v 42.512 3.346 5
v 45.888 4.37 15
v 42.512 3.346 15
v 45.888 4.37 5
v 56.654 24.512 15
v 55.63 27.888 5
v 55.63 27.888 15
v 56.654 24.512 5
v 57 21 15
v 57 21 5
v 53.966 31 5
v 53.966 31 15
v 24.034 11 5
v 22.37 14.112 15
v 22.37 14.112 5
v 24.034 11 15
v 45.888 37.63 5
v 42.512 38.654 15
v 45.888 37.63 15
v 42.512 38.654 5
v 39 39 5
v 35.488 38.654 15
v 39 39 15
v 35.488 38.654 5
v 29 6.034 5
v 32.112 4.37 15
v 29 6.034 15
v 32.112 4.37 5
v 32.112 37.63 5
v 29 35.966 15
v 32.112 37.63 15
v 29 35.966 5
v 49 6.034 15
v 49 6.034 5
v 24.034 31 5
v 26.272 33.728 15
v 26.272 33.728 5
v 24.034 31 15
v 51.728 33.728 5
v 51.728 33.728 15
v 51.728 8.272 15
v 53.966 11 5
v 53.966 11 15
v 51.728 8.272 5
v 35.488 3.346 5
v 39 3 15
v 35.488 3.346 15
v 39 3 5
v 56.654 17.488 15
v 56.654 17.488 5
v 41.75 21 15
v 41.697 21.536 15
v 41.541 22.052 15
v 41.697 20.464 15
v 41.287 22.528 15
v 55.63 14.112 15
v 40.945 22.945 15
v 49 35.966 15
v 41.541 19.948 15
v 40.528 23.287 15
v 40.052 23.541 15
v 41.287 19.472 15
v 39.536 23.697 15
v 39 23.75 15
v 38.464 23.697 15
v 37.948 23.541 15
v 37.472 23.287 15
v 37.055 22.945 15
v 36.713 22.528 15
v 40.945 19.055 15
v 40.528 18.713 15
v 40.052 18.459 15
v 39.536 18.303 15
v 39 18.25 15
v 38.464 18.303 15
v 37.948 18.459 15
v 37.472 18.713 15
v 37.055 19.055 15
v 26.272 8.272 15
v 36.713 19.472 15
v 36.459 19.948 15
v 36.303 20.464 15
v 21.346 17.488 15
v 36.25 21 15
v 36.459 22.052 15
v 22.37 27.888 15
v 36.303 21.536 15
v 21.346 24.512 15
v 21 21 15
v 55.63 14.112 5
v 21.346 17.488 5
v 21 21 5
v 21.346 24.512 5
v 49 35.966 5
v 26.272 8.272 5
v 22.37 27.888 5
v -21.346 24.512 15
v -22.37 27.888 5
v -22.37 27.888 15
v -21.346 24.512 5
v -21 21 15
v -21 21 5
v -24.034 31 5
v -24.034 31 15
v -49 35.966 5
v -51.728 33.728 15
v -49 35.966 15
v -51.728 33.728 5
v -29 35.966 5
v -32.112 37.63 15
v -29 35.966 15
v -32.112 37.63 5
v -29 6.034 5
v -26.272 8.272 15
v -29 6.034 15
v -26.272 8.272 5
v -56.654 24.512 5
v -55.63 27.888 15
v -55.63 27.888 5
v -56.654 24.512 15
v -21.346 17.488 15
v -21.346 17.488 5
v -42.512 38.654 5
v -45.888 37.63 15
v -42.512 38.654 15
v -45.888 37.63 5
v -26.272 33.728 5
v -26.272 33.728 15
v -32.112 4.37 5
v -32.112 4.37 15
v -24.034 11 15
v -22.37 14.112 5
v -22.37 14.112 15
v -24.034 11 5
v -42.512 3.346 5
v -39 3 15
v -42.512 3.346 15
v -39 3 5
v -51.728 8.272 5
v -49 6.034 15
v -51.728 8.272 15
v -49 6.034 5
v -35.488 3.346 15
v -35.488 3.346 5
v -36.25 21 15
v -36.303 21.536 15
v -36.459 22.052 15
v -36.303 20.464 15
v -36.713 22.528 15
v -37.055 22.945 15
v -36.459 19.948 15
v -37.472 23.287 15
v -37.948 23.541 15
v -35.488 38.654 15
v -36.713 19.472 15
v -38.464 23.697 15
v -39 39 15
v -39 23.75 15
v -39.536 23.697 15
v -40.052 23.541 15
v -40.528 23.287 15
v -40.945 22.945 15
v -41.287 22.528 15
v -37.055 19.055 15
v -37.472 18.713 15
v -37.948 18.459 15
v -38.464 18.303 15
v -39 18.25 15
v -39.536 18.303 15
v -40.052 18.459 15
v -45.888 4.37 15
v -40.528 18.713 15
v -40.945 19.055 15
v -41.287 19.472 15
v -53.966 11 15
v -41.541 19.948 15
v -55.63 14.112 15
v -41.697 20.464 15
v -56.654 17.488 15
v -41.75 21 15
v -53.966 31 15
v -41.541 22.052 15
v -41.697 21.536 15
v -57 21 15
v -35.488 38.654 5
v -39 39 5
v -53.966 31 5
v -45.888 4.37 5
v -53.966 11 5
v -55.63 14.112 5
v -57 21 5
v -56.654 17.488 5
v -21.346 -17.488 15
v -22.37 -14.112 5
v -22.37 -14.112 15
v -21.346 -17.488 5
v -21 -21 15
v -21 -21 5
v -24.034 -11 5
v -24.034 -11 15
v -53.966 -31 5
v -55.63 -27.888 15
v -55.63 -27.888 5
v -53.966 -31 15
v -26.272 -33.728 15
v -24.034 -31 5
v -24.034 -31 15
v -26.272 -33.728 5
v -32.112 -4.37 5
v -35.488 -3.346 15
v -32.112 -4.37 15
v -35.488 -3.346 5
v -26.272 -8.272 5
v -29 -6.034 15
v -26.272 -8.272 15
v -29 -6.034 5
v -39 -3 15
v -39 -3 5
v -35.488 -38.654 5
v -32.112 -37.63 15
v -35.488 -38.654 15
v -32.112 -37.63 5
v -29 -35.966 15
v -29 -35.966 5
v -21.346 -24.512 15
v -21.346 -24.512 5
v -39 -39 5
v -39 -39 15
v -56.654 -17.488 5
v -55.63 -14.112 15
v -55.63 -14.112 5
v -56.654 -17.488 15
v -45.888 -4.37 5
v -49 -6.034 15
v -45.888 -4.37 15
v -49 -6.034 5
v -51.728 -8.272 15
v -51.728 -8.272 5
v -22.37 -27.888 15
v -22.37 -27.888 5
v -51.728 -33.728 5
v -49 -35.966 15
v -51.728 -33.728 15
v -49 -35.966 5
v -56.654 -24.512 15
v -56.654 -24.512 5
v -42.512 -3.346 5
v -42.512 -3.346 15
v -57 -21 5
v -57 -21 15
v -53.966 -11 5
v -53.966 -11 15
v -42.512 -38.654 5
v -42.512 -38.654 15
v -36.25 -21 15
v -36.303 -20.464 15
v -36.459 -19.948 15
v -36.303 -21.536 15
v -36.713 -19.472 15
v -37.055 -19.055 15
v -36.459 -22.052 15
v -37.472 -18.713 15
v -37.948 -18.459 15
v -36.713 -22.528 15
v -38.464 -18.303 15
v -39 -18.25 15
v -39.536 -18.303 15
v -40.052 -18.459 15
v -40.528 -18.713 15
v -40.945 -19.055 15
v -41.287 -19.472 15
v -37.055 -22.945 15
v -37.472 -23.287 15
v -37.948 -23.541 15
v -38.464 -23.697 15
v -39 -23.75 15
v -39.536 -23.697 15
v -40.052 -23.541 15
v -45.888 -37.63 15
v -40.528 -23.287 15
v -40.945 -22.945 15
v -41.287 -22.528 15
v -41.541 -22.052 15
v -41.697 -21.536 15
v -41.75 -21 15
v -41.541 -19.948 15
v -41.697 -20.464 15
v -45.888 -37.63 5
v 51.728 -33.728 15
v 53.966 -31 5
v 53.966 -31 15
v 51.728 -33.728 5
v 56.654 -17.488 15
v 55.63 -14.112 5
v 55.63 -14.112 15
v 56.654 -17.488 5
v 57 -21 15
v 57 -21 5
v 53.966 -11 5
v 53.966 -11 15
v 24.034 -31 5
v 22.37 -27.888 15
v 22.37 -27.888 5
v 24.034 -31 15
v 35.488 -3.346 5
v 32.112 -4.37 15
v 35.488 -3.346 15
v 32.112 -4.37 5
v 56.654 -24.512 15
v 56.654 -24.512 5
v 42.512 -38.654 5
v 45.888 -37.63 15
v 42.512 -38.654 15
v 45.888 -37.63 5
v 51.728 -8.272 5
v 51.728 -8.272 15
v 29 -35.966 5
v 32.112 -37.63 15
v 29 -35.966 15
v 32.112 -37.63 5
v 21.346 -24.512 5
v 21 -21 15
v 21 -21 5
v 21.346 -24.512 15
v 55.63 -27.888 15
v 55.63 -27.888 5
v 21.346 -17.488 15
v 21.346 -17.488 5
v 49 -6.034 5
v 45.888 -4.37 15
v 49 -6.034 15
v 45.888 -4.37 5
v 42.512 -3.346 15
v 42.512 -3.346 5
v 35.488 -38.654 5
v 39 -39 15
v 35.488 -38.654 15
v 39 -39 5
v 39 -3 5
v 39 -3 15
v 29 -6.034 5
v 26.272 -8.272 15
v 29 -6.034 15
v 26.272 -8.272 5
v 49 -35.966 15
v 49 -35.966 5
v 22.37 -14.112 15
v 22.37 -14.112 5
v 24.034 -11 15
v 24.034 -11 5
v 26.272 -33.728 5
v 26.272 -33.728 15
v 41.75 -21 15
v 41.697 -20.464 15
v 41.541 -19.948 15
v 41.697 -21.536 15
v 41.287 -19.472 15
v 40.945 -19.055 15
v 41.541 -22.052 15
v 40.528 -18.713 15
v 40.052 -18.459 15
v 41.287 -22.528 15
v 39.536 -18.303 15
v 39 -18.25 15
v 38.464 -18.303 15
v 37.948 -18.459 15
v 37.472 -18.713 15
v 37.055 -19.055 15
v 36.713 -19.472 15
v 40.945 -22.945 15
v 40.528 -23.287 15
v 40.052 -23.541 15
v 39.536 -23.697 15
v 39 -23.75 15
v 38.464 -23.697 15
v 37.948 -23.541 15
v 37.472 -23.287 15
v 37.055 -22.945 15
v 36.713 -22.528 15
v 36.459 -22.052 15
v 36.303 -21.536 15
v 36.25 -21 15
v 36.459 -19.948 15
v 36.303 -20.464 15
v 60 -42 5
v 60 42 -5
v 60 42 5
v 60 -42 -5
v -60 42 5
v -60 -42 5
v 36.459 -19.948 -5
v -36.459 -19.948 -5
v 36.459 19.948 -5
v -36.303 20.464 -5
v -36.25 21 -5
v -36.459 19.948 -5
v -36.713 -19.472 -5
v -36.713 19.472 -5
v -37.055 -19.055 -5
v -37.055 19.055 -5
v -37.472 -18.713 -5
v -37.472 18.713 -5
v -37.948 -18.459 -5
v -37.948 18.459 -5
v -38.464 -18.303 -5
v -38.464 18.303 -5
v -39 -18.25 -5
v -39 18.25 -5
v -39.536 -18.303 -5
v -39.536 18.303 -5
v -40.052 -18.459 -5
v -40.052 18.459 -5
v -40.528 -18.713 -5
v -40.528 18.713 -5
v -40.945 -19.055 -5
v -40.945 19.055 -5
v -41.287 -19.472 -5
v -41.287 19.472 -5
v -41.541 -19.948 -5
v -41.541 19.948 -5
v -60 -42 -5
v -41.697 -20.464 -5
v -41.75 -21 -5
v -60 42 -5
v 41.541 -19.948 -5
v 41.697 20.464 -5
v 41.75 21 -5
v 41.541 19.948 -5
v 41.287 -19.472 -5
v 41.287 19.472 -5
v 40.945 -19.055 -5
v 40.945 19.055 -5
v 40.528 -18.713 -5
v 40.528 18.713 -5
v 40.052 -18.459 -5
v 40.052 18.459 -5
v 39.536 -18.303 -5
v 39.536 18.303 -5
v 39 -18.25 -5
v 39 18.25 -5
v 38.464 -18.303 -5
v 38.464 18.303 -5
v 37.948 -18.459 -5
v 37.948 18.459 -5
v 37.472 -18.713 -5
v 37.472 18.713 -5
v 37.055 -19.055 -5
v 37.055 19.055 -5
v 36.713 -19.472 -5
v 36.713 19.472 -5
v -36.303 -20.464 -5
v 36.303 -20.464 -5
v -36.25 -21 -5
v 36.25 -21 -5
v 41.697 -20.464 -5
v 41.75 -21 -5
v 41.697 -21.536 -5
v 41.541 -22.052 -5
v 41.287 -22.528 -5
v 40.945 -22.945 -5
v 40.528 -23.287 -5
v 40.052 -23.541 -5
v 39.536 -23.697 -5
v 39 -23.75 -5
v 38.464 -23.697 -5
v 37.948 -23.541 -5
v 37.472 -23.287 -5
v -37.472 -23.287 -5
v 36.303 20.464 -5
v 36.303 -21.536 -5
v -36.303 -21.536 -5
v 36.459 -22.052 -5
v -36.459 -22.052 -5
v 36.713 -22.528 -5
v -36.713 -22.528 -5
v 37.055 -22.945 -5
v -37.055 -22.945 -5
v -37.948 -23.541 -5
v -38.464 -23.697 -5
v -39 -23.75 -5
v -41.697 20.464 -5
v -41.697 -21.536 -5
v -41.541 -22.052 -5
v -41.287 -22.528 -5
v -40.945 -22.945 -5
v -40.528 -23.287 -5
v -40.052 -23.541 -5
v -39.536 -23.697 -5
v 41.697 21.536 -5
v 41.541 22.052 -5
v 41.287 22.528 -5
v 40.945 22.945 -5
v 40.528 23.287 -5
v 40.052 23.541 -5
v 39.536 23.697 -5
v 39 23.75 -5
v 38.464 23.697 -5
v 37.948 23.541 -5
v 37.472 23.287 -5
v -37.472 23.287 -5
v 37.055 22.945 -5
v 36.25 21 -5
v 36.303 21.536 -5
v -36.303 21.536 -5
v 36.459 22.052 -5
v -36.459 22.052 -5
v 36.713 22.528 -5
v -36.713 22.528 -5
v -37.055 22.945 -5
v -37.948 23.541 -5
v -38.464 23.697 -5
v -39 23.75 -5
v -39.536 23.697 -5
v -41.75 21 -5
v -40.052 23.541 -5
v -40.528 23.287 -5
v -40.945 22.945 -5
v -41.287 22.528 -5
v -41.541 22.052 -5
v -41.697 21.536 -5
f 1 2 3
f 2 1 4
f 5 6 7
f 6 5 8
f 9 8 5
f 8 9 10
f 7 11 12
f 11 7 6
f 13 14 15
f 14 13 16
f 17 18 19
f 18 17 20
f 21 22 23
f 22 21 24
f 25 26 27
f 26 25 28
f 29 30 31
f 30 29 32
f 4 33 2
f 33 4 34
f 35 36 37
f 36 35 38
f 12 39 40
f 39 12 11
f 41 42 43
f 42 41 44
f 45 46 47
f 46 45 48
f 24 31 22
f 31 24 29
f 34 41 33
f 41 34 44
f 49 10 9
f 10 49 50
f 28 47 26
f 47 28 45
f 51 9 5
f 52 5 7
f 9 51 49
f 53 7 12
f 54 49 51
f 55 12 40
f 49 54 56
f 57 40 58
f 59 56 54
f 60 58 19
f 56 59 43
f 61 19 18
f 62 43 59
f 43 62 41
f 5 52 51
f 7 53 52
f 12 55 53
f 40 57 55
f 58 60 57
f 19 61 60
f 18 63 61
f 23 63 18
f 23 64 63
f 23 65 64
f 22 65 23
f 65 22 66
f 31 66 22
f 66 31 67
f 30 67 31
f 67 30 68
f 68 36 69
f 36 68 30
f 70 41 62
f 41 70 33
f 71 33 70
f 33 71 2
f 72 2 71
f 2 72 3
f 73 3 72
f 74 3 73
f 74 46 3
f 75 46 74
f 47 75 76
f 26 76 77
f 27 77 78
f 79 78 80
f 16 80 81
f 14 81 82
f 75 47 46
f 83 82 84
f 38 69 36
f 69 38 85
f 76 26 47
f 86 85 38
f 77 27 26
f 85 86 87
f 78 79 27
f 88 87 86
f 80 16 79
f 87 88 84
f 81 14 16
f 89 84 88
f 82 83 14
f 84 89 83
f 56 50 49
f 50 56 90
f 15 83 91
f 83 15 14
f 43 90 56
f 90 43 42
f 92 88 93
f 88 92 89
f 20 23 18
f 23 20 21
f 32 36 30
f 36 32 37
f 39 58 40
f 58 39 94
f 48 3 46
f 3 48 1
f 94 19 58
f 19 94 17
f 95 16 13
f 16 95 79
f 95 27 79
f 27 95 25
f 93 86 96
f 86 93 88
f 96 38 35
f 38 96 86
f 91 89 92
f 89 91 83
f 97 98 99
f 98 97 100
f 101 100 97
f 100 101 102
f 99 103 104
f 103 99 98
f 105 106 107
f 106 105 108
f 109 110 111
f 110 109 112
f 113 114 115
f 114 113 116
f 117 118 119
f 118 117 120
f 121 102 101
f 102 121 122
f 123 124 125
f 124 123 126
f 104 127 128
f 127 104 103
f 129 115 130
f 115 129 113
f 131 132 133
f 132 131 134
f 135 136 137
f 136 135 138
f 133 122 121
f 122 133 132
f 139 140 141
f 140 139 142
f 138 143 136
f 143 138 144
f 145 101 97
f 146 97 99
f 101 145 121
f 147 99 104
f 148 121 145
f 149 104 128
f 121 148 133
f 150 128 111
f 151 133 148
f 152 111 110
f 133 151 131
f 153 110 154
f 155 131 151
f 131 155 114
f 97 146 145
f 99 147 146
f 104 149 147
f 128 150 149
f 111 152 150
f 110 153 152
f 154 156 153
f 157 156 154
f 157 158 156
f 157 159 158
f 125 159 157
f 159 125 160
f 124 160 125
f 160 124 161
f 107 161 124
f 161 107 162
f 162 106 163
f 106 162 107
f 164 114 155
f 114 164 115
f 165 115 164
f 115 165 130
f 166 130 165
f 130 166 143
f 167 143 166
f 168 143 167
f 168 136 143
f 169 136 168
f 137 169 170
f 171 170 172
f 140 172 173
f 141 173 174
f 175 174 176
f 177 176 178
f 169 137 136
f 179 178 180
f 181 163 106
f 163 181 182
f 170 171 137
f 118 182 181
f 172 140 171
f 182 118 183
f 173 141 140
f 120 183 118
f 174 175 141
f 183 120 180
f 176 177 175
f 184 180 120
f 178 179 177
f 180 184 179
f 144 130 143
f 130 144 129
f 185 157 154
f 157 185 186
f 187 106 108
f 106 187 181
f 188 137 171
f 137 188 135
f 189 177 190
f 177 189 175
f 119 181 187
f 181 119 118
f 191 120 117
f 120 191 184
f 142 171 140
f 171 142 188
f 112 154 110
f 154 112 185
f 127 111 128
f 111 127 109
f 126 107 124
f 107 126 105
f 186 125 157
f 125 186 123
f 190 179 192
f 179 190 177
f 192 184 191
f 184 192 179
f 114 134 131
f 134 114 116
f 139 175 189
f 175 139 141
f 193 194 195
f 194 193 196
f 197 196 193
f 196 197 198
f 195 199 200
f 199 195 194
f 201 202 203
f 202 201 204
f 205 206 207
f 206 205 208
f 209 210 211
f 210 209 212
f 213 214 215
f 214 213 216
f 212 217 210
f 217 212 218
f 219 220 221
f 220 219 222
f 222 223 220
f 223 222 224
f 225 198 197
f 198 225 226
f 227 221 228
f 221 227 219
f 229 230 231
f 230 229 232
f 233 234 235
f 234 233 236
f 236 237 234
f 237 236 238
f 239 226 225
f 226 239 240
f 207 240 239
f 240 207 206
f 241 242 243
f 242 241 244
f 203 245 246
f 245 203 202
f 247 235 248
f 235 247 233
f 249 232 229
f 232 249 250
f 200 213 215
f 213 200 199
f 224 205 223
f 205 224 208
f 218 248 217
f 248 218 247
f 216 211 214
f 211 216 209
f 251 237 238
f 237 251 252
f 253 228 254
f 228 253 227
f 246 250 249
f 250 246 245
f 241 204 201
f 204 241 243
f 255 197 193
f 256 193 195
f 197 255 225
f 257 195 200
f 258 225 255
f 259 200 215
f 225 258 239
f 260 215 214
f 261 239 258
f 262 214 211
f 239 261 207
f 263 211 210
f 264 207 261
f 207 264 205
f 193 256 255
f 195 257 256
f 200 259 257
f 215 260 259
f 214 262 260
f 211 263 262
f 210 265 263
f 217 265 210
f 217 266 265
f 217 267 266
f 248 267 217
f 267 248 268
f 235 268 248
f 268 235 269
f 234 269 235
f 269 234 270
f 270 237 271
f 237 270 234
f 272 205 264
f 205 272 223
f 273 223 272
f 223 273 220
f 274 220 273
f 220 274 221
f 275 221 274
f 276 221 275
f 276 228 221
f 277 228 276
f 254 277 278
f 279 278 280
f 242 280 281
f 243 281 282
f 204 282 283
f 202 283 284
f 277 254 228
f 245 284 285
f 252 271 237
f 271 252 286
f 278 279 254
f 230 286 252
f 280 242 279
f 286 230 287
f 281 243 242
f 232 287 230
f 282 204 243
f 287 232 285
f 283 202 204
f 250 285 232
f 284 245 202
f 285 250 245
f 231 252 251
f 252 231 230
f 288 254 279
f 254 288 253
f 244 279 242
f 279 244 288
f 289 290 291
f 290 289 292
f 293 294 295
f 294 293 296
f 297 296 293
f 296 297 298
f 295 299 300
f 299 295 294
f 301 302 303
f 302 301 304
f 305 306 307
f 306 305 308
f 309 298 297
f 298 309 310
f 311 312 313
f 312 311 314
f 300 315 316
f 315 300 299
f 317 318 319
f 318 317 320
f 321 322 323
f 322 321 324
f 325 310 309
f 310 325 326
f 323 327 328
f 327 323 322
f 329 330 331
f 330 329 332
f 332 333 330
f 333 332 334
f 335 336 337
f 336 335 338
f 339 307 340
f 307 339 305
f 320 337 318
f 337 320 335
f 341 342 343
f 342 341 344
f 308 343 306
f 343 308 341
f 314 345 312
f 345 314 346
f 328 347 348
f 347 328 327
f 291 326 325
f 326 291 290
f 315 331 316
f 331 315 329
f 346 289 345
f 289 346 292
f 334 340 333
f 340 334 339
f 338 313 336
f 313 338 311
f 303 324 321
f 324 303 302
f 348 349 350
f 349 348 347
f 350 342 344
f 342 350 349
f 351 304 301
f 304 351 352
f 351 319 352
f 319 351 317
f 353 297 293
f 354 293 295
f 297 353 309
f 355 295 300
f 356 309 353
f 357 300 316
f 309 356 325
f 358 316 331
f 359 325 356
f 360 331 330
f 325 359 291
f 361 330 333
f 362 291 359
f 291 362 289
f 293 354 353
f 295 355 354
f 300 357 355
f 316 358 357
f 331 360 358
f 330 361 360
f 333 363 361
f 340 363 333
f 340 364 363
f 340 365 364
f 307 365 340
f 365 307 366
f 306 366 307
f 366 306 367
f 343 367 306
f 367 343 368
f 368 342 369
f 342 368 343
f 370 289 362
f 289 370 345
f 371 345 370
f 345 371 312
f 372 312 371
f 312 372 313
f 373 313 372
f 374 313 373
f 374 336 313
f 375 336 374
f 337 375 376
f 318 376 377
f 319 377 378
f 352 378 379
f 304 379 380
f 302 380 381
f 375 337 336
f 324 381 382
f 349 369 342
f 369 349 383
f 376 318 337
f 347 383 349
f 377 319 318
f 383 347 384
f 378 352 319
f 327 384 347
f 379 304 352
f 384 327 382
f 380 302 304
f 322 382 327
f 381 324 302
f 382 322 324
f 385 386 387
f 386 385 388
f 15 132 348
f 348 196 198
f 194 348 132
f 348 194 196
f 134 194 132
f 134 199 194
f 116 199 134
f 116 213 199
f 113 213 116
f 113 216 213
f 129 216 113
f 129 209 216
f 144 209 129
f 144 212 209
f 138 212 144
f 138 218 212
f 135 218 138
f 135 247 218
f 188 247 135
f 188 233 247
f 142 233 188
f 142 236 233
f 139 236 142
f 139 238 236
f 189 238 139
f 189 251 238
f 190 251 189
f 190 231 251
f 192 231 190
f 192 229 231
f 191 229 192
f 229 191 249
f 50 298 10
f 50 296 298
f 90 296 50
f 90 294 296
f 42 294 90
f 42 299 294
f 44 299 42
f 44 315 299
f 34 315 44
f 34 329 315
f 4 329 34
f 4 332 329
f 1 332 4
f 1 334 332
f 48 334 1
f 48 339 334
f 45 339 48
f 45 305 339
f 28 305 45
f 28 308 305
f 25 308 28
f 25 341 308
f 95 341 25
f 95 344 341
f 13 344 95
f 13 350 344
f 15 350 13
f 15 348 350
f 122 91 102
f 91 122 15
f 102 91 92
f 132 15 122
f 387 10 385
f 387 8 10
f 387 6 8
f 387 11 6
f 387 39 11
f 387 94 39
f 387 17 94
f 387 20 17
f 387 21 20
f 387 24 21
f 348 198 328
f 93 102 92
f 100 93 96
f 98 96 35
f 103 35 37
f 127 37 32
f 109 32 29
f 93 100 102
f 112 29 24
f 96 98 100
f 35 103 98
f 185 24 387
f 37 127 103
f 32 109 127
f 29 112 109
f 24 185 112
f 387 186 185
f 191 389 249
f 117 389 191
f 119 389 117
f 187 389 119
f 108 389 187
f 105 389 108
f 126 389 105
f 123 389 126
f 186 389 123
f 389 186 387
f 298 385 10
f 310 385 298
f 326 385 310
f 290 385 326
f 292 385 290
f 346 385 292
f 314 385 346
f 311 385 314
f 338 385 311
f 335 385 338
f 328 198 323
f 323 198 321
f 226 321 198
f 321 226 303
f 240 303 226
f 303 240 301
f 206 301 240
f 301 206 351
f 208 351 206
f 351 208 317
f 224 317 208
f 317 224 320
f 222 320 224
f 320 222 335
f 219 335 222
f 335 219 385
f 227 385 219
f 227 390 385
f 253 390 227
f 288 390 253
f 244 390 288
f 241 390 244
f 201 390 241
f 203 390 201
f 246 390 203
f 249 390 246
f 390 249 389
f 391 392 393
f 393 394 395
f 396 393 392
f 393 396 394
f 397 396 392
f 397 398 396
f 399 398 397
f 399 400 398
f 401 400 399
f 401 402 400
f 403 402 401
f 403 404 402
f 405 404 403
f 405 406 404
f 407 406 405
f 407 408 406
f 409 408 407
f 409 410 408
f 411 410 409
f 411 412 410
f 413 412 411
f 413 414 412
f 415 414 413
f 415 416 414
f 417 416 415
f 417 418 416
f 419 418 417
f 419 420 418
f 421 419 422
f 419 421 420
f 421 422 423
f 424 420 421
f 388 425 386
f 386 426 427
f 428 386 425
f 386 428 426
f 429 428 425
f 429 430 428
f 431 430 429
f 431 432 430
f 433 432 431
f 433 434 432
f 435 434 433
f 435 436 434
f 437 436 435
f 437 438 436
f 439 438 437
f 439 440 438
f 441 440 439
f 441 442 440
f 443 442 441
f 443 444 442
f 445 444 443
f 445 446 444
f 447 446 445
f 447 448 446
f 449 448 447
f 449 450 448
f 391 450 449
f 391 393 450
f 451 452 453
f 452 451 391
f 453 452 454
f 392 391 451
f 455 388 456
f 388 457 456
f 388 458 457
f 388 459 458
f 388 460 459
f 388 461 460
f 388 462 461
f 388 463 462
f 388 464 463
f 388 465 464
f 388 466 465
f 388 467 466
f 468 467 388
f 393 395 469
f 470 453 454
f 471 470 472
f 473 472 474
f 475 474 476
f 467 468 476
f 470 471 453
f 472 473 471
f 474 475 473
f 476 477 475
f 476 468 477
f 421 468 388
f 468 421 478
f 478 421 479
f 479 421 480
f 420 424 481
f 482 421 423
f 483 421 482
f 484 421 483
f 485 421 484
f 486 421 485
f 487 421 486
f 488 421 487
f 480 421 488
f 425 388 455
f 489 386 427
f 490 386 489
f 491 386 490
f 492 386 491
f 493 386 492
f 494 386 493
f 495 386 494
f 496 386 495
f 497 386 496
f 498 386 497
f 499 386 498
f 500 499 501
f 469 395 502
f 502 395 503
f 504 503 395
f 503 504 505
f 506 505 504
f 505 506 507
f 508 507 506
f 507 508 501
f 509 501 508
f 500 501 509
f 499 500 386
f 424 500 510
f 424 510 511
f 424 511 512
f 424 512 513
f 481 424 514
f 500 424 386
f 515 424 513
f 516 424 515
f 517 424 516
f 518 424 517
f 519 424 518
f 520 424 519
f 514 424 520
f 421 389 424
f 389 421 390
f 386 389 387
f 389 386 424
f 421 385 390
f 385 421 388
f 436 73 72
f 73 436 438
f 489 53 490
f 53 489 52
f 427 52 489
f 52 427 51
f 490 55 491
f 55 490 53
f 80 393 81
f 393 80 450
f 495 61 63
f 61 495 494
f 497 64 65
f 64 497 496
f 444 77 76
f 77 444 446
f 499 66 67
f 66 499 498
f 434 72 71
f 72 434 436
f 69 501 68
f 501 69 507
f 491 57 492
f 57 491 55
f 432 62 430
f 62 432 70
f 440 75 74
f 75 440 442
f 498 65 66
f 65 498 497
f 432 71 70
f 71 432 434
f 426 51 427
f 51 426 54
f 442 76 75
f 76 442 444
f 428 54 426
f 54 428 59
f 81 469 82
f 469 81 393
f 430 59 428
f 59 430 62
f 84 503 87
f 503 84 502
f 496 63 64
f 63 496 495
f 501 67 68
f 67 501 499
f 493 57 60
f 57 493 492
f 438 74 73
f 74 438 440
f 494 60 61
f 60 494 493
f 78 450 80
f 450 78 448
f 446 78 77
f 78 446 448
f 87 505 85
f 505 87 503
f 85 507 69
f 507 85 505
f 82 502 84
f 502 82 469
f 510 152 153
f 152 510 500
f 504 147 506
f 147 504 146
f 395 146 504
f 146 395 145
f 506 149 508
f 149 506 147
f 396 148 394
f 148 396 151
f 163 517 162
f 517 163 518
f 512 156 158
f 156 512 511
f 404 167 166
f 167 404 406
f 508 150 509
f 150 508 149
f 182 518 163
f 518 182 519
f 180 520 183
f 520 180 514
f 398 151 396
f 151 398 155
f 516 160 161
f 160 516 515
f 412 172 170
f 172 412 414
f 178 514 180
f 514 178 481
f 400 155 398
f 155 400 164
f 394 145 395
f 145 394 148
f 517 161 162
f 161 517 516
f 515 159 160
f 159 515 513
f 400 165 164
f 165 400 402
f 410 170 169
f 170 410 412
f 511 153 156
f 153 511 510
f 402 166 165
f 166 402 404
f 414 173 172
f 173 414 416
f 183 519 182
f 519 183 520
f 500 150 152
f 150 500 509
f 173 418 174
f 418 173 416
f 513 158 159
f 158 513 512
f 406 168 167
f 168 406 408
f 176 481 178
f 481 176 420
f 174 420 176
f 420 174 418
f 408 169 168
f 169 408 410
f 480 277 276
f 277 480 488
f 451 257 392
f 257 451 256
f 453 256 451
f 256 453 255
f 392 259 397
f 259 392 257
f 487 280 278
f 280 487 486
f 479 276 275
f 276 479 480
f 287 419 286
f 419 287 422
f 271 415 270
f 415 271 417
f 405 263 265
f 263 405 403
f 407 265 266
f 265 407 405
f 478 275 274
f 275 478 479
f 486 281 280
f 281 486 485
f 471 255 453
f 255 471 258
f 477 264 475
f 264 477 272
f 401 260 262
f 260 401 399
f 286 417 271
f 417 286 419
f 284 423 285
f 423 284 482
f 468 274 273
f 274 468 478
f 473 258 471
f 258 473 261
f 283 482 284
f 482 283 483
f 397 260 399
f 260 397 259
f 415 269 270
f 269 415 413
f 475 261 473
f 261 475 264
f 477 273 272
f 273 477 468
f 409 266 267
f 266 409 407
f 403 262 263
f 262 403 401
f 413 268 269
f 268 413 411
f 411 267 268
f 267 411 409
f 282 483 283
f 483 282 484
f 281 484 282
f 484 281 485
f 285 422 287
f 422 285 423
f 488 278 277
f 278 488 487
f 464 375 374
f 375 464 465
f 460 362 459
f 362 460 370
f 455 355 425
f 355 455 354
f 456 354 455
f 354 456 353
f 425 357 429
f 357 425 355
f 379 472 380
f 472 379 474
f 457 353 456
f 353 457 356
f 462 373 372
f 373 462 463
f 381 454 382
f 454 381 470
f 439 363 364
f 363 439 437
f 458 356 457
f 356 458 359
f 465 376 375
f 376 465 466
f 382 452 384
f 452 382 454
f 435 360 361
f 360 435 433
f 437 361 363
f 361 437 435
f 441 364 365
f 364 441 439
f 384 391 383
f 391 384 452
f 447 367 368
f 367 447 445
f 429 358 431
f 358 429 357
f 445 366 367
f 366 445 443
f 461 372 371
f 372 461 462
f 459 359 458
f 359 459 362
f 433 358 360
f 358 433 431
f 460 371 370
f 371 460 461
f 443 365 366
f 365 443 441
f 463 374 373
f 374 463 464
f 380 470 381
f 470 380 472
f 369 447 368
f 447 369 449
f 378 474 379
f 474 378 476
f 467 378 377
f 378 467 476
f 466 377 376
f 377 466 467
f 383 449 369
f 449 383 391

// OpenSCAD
$fn = 32;

// ----------------------------------------------------------------------
// Anchor pads 120 x 84 x 20
// four corner bosses with anchor holes
// ----------------------------------------------------------------------

// --- parameters (mm) ---
plate = [120, 84, 10];  // base plate size (x, y, z)
pads = 4;               // boss count, one per corner
edge = 21;              // boss centre offset from the plate edge
boss_d = 36;            // boss diameter
boss_h = 10;            // boss height above the base plate
hole_d = 5.5;           // hole diameter

// --- derived feature positions (mm) ---
height = plate[2] + boss_h;      // = 20   overall height of the part
corner_x = plate[0] / 2 - edge;  // = 39   boss centre X
corner_y = plate[1] / 2 - edge;  // = 21   boss centre Y
feature_centers = [
  [corner_x, corner_y],
  [-corner_x, corner_y],
  [-corner_x, -corner_y],
  [corner_x, -corner_y]
];   // boss centres, anchor holes are drilled there

// base plate, four bosses standing on it, anchor holes all the way through
difference() {
  union() {
    cube(plate, center = true);
    for (centre = feature_centers)
      translate([centre[0], centre[1], plate[2] / 2 - 1])
        cylinder(d = boss_d, h = boss_h + 1);
  }
  for (centre = feature_centers)
    translate([centre[0], centre[1], -height])
      cylinder(d = hole_d, h = 2 * height + 2);  // through boss and plate
}
